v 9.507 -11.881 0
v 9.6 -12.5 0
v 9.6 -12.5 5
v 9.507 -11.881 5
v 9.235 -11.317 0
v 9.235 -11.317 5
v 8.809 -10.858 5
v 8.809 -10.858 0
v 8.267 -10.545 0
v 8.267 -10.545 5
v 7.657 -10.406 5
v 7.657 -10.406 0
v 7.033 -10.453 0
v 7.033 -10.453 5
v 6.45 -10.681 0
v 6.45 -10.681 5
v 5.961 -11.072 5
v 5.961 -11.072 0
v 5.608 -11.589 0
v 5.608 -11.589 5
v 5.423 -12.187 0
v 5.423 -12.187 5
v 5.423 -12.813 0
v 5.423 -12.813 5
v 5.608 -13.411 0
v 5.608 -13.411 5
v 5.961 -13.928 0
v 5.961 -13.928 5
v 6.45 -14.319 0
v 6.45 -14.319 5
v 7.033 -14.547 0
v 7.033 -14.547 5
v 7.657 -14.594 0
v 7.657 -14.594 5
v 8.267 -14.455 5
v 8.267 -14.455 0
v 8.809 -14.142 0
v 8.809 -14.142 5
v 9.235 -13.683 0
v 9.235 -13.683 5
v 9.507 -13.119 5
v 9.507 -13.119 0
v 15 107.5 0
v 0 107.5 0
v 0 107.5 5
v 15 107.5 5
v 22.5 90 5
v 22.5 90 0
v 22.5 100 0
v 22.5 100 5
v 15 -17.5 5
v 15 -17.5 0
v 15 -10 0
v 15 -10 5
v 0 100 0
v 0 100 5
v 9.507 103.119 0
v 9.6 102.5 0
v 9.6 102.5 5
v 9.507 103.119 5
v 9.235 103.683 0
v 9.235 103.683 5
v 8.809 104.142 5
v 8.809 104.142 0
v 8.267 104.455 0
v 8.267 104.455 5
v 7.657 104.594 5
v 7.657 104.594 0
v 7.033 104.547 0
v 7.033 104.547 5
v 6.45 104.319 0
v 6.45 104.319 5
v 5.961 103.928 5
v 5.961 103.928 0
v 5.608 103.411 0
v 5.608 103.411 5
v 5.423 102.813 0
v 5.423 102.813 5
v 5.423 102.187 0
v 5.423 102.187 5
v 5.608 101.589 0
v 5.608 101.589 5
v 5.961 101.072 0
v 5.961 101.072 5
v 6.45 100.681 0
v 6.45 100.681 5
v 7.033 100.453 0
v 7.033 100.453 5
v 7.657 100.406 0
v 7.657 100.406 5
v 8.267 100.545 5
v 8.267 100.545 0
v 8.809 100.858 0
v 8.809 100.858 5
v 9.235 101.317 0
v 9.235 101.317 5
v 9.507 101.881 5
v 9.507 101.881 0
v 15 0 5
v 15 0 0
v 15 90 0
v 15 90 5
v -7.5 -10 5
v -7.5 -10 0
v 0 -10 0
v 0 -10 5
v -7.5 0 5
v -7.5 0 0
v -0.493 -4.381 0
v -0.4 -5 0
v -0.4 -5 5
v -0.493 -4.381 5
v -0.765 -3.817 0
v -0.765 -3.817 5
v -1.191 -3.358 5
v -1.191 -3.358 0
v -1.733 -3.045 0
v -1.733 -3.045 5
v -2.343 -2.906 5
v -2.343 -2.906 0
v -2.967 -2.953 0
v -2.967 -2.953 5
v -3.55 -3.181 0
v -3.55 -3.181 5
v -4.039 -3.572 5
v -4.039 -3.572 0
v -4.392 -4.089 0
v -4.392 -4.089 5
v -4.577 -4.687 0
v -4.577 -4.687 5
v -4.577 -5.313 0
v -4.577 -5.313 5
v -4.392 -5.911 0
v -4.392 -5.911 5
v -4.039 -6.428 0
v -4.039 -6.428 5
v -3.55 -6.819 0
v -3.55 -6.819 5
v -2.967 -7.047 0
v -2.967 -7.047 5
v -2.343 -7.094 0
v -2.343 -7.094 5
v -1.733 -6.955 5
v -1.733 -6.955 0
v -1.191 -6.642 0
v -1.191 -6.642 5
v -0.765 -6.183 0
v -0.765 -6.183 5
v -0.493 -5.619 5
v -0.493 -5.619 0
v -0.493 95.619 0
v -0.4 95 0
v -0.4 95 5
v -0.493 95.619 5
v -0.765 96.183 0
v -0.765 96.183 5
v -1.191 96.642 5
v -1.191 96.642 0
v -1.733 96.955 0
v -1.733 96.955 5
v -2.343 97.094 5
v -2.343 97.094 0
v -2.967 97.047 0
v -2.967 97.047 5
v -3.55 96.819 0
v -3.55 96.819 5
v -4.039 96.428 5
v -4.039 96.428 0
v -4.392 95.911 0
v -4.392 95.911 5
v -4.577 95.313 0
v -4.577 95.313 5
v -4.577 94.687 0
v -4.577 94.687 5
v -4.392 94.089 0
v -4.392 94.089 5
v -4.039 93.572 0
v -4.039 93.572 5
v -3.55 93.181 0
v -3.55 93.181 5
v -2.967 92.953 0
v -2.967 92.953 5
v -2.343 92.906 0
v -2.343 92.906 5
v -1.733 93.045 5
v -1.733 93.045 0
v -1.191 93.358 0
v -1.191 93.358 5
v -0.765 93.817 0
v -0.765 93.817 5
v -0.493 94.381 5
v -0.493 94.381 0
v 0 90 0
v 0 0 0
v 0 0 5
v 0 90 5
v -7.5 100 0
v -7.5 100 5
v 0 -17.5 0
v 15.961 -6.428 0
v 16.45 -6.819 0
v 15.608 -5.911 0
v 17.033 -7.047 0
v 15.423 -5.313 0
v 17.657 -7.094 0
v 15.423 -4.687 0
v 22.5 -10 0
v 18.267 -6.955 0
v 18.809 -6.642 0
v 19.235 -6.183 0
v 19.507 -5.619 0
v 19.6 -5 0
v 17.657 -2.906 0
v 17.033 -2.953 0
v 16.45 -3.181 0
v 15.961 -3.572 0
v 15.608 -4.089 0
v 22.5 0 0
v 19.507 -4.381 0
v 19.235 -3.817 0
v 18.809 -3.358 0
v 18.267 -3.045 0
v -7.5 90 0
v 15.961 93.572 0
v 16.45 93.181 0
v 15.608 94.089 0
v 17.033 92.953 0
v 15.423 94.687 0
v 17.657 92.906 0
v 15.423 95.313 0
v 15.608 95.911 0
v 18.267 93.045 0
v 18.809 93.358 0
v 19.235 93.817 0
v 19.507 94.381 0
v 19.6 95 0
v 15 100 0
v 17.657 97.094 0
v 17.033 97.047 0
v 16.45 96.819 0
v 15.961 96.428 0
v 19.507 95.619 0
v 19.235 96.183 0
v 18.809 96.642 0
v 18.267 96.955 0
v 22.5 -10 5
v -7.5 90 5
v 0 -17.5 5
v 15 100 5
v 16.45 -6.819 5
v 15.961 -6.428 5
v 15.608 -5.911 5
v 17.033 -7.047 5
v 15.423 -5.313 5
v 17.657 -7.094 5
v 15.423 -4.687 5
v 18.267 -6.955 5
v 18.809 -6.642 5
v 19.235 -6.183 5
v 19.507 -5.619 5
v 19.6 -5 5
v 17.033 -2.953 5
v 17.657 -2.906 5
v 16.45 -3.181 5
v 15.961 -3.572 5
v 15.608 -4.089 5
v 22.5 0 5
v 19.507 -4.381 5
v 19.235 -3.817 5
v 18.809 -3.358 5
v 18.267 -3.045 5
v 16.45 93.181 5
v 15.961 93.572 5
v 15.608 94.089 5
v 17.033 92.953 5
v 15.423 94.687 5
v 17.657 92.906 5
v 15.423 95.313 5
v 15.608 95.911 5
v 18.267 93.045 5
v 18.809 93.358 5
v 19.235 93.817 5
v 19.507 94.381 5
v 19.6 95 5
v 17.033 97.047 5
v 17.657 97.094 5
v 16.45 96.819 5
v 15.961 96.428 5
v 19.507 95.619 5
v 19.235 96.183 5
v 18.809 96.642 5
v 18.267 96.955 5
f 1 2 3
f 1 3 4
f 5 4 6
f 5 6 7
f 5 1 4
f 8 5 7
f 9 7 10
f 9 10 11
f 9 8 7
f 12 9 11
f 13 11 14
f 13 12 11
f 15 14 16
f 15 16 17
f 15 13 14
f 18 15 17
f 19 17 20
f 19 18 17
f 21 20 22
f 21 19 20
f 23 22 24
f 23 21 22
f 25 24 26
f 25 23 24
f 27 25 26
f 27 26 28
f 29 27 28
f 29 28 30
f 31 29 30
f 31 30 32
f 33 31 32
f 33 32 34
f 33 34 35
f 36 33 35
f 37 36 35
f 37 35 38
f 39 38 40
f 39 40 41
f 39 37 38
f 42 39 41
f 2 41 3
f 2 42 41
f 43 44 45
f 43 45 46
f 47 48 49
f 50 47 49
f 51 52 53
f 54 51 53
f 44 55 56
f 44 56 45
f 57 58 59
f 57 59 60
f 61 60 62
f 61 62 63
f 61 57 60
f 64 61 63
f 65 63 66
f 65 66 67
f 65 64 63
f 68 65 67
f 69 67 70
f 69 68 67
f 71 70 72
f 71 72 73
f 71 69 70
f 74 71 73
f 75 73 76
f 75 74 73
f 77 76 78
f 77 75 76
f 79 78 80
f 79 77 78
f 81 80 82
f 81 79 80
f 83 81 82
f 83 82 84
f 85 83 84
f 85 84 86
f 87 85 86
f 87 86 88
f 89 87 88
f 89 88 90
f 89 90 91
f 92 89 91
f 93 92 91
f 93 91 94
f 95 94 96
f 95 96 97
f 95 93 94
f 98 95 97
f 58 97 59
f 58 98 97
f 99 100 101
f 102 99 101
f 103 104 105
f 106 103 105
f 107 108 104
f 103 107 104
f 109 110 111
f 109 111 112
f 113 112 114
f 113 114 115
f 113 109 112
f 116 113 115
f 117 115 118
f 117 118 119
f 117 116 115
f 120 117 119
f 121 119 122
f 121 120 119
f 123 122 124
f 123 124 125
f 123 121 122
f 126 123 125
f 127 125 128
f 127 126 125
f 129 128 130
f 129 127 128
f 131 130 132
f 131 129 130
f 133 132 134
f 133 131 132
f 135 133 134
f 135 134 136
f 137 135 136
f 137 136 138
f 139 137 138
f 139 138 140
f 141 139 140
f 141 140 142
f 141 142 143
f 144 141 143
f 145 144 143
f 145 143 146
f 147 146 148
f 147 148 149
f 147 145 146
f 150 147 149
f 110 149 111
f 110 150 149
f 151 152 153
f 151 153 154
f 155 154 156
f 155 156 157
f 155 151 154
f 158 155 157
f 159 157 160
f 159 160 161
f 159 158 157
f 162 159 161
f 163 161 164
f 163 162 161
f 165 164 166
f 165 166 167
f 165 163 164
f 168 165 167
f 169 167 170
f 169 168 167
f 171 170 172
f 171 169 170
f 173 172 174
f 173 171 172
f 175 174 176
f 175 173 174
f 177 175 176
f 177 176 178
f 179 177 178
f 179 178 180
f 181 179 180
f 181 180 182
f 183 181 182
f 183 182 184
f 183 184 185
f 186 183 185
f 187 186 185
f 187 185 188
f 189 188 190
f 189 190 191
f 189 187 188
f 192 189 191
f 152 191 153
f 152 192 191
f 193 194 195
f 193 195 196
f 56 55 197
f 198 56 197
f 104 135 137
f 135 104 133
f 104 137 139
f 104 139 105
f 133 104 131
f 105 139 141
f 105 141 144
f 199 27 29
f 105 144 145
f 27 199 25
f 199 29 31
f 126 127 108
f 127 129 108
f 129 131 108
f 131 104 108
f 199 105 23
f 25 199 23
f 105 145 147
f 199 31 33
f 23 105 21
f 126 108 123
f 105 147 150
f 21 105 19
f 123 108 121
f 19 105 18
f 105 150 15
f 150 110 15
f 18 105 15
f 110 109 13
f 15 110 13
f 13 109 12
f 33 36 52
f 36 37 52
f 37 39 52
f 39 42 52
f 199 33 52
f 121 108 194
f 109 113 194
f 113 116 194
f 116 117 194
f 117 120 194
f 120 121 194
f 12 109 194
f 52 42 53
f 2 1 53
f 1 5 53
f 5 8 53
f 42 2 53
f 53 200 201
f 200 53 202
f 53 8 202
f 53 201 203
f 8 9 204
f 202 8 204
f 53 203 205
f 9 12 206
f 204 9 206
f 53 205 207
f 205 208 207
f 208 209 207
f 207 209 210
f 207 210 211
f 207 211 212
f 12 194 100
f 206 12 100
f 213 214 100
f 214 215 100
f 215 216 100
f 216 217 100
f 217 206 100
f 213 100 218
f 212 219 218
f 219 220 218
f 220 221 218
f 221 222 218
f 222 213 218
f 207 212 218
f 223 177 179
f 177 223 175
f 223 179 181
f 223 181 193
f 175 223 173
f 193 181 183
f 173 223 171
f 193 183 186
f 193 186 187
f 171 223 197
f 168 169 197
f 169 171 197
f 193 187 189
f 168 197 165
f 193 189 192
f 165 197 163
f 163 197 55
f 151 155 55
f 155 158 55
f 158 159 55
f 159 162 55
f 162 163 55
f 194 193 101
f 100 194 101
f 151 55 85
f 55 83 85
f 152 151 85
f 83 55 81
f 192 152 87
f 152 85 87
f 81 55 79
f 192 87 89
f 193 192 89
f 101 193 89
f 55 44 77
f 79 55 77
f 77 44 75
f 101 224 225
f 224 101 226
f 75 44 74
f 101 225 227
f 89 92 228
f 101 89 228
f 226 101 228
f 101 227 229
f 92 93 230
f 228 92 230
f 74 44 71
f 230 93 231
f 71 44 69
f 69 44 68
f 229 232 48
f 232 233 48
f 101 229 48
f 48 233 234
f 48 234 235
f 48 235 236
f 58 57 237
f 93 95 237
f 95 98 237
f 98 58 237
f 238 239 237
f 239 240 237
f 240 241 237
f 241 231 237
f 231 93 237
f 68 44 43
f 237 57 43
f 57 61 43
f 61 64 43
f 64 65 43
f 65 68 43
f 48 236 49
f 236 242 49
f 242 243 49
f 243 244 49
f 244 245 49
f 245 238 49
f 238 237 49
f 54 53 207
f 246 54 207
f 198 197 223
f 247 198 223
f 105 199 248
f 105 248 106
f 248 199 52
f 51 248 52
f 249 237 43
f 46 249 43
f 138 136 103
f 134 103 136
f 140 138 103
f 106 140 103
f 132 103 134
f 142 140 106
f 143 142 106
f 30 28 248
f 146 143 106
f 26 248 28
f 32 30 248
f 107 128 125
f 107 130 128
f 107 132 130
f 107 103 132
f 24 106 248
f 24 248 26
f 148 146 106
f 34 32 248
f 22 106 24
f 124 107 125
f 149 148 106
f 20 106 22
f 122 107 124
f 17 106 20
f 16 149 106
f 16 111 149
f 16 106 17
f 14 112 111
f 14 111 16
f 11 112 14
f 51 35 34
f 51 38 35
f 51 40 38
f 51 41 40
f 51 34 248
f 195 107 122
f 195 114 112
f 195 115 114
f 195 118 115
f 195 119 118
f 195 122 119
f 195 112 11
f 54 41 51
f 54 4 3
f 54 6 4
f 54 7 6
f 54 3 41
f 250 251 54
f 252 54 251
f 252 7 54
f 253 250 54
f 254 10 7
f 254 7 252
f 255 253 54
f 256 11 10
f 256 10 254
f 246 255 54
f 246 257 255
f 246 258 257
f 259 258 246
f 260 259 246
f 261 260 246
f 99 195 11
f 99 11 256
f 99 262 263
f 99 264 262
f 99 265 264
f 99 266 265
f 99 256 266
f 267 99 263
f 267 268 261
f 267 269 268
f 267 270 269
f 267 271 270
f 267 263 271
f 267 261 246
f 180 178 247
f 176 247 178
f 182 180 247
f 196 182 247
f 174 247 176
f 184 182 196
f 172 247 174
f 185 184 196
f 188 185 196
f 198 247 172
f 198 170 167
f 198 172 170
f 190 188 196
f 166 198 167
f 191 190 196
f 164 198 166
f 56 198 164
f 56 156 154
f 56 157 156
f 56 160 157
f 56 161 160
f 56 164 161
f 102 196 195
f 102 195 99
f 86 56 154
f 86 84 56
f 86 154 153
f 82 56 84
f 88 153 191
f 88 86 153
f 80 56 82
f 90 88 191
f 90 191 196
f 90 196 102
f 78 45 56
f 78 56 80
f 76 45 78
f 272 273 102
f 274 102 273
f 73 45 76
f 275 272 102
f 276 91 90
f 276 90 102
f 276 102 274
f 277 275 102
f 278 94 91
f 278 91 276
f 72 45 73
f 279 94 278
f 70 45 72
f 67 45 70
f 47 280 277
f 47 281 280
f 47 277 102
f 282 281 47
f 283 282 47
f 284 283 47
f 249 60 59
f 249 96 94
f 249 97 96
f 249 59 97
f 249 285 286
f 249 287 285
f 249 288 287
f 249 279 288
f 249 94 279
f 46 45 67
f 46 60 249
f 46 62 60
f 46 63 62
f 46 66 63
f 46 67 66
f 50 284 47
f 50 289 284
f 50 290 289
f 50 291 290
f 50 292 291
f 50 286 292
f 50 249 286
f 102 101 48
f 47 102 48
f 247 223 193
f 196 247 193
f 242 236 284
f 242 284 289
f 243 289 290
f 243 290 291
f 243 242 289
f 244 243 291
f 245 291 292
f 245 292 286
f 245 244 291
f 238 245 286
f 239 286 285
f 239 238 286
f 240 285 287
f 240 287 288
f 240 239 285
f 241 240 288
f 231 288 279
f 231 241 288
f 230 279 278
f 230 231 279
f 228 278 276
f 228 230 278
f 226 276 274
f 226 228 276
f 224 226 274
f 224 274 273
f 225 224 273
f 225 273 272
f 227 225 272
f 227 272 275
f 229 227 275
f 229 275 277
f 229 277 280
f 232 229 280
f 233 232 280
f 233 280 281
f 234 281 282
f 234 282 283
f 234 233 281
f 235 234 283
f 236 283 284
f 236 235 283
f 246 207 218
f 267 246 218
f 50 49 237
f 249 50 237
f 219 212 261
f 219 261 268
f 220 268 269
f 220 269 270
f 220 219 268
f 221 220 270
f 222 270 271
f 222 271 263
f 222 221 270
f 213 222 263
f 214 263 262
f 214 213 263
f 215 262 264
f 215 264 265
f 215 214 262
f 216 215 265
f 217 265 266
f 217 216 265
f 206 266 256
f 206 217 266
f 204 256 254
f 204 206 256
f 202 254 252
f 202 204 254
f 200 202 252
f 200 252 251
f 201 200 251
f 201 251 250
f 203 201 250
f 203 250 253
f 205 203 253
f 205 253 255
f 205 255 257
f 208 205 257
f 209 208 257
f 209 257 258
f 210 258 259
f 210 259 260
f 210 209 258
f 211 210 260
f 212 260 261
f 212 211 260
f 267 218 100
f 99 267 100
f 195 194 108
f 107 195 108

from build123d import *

# Parameters (mm, degrees)
SKETCH1_W           = 15
SKETCH1_H           = 90
SKETCH1_R           = 2.1
SKETCH1_H_2         = 7.5
BOSS_EXTRUDE1_DEPTH = 5


with BuildPart() as part:
    # Sketch1 → Boss-Extrude1 (new body)
    with BuildSketch(Plane.XY):
        with Locations((7.5, 45)):
            Rectangle(SKETCH1_W, SKETCH1_H)
        Polygon((-7.5, 90), (0, 90), (15, 90), (22.5, 90), (22.5, 100), (15, 100), (0, 100), (-7.5, 100), align=None)
        with Locations((-2.5, 95)):
            Circle(SKETCH1_R, mode=Mode.SUBTRACT)
        with Locations((17.5, 95)):
            Circle(SKETCH1_R, mode=Mode.SUBTRACT)
        with Locations((7.5, 103.75)):
            Rectangle(SKETCH1_W, SKETCH1_H_2)
        with Locations((7.5, 102.5)):
            Circle(SKETCH1_R, mode=Mode.SUBTRACT)
        Polygon((15, 0), (0, 0), (-7.5, 0), (-7.5, -10), (0, -10), (15, -10), (22.5, -10), (22.5, 0), align=None)
        with Locations((-2.5, -5)):
            Circle(SKETCH1_R, mode=Mode.SUBTRACT)
        with Locations((17.5, -5)):
            Circle(SKETCH1_R, mode=Mode.SUBTRACT)
        with Locations((7.5, -13.75)):
            Rectangle(SKETCH1_W, SKETCH1_H_2)
        with Locations((7.5, -12.5)):
            Circle(SKETCH1_R, mode=Mode.SUBTRACT)
    extrude(amount=BOSS_EXTRUDE1_DEPTH)


solid = part.part
